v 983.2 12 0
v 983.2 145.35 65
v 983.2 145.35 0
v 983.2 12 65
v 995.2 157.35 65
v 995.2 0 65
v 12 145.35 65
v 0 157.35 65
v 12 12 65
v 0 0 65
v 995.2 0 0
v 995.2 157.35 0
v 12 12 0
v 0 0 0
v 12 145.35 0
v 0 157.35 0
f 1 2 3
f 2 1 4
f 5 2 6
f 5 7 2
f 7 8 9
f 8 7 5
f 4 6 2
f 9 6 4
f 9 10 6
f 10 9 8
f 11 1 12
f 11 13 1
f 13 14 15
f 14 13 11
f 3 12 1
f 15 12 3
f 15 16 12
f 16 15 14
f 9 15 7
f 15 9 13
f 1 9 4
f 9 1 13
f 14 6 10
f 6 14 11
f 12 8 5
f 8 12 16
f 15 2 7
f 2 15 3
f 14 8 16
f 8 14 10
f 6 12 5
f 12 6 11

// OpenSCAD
// file: models/frame.scad
/*
 * Outer frame of the keyboard
 */

include <../utils/units.scad>;

upper_depth = 65.0;
front_depth = 30.0;
thickness = 12.0;

module rack(innerWidth) {
    translate([thickness, 0, 0]) cube([innerWidth, thickness, upper_depth]);
    translate([thickness, 3*U+thickness, 0]) cube([innerWidth, thickness, upper_depth]);
    cube([thickness, 3*U+2*thickness, upper_depth]);
    translate([thickness+innerWidth, 0, 0]) cube([thickness, 3*U+2*thickness, upper_depth]);
    translate([thickness, thickness, 0]) children();
}

module keyframe(innerWidth) {

}
// file: utils/units.scad
/*
 * Standard units of measurement
 */
HP = 5.08;
U = 44.45;
KEY_LENGTH = 155.0;
SCALE = 165.0;
WHITE_WIDTH = SCALE/7.0;

function hp_to_width(hp) = hp*HP + 55.4 - 24.0;
// main file
/*
 * Assembled model with all pieces in place
 */
include <./utils/units.scad>;
use <./models/frame.scad>;

rack(hp_to_width(185)) {

}
